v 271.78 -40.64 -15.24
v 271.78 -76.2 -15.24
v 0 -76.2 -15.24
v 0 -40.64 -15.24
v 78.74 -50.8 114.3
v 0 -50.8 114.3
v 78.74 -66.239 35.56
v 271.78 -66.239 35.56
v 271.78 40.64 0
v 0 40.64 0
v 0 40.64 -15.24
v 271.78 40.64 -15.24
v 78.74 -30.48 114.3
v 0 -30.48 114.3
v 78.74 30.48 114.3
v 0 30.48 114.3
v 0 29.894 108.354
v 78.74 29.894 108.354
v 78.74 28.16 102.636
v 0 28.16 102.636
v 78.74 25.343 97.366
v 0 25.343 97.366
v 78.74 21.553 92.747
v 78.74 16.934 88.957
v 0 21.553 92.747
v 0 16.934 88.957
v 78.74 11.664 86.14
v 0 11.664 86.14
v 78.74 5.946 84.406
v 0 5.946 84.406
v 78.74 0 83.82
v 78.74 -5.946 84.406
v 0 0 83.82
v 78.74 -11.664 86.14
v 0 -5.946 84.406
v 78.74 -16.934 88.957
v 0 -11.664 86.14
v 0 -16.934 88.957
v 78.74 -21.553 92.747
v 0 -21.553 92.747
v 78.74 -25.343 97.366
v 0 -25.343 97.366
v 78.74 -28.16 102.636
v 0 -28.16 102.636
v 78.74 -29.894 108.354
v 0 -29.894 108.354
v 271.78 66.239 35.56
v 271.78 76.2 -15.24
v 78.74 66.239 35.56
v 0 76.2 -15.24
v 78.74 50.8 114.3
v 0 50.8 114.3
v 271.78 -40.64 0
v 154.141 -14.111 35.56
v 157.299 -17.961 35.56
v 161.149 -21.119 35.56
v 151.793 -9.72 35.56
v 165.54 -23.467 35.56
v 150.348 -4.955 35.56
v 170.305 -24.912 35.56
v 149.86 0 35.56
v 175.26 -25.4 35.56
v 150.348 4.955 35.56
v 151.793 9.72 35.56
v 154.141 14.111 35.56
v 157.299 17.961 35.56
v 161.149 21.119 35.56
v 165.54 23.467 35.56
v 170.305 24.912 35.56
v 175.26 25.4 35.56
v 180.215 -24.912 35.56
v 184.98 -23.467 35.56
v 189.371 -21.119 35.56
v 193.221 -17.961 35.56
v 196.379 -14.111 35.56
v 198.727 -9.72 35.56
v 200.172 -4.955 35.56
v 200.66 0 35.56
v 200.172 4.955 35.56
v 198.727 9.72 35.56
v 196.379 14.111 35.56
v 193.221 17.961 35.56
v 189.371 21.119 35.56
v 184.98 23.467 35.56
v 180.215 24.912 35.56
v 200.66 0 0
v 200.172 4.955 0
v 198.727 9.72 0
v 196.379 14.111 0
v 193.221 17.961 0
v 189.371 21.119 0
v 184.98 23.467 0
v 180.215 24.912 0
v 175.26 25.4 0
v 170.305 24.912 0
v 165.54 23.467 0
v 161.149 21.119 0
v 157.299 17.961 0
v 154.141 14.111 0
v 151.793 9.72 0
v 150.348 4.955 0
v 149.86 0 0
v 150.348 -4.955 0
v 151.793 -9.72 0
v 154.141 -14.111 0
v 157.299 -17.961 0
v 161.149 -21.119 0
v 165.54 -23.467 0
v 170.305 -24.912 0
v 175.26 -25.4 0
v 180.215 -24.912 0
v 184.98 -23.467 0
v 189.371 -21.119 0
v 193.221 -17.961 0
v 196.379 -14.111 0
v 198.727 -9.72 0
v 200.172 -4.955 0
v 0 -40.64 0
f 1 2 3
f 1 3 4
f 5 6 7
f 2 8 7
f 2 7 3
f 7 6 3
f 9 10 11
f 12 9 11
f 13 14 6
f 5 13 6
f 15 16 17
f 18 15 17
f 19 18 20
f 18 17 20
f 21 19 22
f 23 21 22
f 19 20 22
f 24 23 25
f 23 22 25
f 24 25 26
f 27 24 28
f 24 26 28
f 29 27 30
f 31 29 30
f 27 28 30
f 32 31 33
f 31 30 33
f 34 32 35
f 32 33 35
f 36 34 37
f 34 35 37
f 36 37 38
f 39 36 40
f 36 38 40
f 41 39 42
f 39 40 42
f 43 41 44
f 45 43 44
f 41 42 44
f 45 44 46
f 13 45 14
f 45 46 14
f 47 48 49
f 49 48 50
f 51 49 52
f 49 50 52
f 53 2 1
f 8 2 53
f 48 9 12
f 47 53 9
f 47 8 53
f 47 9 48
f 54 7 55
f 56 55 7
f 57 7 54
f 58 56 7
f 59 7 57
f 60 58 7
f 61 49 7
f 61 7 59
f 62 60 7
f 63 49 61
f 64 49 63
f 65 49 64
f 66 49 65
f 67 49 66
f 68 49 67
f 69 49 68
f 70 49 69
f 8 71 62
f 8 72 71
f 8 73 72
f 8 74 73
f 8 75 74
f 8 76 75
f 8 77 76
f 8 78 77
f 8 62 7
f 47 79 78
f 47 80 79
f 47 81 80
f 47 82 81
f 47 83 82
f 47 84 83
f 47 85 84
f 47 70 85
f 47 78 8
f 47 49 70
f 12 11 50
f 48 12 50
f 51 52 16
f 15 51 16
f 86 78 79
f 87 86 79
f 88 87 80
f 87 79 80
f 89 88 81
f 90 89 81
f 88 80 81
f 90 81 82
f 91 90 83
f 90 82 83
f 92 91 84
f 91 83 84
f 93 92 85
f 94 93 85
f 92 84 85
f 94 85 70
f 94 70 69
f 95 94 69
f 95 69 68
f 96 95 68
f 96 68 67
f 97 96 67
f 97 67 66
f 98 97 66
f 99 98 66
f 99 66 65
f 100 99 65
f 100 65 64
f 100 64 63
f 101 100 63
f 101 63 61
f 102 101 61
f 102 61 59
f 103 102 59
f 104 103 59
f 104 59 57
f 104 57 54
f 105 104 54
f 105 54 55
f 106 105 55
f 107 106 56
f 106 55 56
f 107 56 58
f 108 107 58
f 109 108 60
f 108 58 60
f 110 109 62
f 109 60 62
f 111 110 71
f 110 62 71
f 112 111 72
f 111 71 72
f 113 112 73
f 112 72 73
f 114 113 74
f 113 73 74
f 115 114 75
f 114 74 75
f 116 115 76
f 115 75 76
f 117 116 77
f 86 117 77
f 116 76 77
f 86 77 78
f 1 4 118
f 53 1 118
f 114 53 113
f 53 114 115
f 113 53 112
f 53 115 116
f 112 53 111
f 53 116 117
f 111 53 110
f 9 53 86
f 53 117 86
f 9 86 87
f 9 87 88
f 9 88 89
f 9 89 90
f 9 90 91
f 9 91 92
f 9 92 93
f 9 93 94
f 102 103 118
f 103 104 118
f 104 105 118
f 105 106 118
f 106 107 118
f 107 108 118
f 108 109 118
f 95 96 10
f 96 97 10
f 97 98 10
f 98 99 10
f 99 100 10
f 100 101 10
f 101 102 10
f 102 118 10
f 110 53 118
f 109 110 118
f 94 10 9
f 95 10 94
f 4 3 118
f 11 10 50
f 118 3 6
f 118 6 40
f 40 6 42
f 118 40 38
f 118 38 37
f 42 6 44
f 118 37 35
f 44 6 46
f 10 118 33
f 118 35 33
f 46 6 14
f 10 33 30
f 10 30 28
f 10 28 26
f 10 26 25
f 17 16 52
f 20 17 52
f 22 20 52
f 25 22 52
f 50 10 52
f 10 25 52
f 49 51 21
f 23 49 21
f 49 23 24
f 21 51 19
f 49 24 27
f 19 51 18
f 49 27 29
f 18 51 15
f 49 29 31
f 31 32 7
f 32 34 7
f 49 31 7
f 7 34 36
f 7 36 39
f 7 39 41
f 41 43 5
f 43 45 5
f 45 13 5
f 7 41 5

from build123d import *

# Parameters (mm, degrees)
F1_DEPTH = 271.78
F2_W     = 193.04
F2_H     = 25.4
F2_H_2   = 20.32
F2_H_3   = 106.68
F3_DEPTH = 78.74
F4_R     = 25.4
F5_DEPTH = 76.2


with BuildPart() as f1:
    # F0 (on Right) → F1 (new body)
    with BuildSketch(Plane.YZ):
        with BuildLine():
            Line((-40.64, 0), (0, 0))
            Line((0, 0), (40.64, 0))
            Line((40.64, 0), (40.64, -15.24))
            Line((40.64, -15.24), (76.2, -15.24))
            Line((76.2, -15.24), (50.8, 114.3))
            Line((50.8, 114.3), (30.48, 114.3))
            ThreePointArc((30.48, 114.3), (0, 83.82), (-30.48, 114.3))
            Line((-30.48, 114.3), (-50.8, 114.3))
            Line((-50.8, 114.3), (-76.2, -15.24))
            Line((-76.2, -15.24), (-40.64, -15.24))
            Line((-40.64, -15.24), (-40.64, 0))
        make_face()
    extrude(amount=F1_DEPTH)

    # F2 (on face) → F3 (cut)
    with BuildSketch(Plane.XY.offset(114.3)):
        with Locations((175.26, 63.5)):
            Rectangle(F2_W, F2_H)
        with Locations((175.26, 40.64)):
            Rectangle(F2_W, F2_H_2)
        with Locations((175.26, -22.86)):
            Rectangle(F2_W, F2_H_3)
    extrude(amount=-F3_DEPTH, mode=Mode.SUBTRACT)

    # F4 (on face) → F5 (cut)
    with BuildSketch(Plane.XY.offset(35.56)):
        with Locations((175.26, 0)):
            Circle(F4_R)
    extrude(amount=-F5_DEPTH, mode=Mode.SUBTRACT)


solid = f1.part
